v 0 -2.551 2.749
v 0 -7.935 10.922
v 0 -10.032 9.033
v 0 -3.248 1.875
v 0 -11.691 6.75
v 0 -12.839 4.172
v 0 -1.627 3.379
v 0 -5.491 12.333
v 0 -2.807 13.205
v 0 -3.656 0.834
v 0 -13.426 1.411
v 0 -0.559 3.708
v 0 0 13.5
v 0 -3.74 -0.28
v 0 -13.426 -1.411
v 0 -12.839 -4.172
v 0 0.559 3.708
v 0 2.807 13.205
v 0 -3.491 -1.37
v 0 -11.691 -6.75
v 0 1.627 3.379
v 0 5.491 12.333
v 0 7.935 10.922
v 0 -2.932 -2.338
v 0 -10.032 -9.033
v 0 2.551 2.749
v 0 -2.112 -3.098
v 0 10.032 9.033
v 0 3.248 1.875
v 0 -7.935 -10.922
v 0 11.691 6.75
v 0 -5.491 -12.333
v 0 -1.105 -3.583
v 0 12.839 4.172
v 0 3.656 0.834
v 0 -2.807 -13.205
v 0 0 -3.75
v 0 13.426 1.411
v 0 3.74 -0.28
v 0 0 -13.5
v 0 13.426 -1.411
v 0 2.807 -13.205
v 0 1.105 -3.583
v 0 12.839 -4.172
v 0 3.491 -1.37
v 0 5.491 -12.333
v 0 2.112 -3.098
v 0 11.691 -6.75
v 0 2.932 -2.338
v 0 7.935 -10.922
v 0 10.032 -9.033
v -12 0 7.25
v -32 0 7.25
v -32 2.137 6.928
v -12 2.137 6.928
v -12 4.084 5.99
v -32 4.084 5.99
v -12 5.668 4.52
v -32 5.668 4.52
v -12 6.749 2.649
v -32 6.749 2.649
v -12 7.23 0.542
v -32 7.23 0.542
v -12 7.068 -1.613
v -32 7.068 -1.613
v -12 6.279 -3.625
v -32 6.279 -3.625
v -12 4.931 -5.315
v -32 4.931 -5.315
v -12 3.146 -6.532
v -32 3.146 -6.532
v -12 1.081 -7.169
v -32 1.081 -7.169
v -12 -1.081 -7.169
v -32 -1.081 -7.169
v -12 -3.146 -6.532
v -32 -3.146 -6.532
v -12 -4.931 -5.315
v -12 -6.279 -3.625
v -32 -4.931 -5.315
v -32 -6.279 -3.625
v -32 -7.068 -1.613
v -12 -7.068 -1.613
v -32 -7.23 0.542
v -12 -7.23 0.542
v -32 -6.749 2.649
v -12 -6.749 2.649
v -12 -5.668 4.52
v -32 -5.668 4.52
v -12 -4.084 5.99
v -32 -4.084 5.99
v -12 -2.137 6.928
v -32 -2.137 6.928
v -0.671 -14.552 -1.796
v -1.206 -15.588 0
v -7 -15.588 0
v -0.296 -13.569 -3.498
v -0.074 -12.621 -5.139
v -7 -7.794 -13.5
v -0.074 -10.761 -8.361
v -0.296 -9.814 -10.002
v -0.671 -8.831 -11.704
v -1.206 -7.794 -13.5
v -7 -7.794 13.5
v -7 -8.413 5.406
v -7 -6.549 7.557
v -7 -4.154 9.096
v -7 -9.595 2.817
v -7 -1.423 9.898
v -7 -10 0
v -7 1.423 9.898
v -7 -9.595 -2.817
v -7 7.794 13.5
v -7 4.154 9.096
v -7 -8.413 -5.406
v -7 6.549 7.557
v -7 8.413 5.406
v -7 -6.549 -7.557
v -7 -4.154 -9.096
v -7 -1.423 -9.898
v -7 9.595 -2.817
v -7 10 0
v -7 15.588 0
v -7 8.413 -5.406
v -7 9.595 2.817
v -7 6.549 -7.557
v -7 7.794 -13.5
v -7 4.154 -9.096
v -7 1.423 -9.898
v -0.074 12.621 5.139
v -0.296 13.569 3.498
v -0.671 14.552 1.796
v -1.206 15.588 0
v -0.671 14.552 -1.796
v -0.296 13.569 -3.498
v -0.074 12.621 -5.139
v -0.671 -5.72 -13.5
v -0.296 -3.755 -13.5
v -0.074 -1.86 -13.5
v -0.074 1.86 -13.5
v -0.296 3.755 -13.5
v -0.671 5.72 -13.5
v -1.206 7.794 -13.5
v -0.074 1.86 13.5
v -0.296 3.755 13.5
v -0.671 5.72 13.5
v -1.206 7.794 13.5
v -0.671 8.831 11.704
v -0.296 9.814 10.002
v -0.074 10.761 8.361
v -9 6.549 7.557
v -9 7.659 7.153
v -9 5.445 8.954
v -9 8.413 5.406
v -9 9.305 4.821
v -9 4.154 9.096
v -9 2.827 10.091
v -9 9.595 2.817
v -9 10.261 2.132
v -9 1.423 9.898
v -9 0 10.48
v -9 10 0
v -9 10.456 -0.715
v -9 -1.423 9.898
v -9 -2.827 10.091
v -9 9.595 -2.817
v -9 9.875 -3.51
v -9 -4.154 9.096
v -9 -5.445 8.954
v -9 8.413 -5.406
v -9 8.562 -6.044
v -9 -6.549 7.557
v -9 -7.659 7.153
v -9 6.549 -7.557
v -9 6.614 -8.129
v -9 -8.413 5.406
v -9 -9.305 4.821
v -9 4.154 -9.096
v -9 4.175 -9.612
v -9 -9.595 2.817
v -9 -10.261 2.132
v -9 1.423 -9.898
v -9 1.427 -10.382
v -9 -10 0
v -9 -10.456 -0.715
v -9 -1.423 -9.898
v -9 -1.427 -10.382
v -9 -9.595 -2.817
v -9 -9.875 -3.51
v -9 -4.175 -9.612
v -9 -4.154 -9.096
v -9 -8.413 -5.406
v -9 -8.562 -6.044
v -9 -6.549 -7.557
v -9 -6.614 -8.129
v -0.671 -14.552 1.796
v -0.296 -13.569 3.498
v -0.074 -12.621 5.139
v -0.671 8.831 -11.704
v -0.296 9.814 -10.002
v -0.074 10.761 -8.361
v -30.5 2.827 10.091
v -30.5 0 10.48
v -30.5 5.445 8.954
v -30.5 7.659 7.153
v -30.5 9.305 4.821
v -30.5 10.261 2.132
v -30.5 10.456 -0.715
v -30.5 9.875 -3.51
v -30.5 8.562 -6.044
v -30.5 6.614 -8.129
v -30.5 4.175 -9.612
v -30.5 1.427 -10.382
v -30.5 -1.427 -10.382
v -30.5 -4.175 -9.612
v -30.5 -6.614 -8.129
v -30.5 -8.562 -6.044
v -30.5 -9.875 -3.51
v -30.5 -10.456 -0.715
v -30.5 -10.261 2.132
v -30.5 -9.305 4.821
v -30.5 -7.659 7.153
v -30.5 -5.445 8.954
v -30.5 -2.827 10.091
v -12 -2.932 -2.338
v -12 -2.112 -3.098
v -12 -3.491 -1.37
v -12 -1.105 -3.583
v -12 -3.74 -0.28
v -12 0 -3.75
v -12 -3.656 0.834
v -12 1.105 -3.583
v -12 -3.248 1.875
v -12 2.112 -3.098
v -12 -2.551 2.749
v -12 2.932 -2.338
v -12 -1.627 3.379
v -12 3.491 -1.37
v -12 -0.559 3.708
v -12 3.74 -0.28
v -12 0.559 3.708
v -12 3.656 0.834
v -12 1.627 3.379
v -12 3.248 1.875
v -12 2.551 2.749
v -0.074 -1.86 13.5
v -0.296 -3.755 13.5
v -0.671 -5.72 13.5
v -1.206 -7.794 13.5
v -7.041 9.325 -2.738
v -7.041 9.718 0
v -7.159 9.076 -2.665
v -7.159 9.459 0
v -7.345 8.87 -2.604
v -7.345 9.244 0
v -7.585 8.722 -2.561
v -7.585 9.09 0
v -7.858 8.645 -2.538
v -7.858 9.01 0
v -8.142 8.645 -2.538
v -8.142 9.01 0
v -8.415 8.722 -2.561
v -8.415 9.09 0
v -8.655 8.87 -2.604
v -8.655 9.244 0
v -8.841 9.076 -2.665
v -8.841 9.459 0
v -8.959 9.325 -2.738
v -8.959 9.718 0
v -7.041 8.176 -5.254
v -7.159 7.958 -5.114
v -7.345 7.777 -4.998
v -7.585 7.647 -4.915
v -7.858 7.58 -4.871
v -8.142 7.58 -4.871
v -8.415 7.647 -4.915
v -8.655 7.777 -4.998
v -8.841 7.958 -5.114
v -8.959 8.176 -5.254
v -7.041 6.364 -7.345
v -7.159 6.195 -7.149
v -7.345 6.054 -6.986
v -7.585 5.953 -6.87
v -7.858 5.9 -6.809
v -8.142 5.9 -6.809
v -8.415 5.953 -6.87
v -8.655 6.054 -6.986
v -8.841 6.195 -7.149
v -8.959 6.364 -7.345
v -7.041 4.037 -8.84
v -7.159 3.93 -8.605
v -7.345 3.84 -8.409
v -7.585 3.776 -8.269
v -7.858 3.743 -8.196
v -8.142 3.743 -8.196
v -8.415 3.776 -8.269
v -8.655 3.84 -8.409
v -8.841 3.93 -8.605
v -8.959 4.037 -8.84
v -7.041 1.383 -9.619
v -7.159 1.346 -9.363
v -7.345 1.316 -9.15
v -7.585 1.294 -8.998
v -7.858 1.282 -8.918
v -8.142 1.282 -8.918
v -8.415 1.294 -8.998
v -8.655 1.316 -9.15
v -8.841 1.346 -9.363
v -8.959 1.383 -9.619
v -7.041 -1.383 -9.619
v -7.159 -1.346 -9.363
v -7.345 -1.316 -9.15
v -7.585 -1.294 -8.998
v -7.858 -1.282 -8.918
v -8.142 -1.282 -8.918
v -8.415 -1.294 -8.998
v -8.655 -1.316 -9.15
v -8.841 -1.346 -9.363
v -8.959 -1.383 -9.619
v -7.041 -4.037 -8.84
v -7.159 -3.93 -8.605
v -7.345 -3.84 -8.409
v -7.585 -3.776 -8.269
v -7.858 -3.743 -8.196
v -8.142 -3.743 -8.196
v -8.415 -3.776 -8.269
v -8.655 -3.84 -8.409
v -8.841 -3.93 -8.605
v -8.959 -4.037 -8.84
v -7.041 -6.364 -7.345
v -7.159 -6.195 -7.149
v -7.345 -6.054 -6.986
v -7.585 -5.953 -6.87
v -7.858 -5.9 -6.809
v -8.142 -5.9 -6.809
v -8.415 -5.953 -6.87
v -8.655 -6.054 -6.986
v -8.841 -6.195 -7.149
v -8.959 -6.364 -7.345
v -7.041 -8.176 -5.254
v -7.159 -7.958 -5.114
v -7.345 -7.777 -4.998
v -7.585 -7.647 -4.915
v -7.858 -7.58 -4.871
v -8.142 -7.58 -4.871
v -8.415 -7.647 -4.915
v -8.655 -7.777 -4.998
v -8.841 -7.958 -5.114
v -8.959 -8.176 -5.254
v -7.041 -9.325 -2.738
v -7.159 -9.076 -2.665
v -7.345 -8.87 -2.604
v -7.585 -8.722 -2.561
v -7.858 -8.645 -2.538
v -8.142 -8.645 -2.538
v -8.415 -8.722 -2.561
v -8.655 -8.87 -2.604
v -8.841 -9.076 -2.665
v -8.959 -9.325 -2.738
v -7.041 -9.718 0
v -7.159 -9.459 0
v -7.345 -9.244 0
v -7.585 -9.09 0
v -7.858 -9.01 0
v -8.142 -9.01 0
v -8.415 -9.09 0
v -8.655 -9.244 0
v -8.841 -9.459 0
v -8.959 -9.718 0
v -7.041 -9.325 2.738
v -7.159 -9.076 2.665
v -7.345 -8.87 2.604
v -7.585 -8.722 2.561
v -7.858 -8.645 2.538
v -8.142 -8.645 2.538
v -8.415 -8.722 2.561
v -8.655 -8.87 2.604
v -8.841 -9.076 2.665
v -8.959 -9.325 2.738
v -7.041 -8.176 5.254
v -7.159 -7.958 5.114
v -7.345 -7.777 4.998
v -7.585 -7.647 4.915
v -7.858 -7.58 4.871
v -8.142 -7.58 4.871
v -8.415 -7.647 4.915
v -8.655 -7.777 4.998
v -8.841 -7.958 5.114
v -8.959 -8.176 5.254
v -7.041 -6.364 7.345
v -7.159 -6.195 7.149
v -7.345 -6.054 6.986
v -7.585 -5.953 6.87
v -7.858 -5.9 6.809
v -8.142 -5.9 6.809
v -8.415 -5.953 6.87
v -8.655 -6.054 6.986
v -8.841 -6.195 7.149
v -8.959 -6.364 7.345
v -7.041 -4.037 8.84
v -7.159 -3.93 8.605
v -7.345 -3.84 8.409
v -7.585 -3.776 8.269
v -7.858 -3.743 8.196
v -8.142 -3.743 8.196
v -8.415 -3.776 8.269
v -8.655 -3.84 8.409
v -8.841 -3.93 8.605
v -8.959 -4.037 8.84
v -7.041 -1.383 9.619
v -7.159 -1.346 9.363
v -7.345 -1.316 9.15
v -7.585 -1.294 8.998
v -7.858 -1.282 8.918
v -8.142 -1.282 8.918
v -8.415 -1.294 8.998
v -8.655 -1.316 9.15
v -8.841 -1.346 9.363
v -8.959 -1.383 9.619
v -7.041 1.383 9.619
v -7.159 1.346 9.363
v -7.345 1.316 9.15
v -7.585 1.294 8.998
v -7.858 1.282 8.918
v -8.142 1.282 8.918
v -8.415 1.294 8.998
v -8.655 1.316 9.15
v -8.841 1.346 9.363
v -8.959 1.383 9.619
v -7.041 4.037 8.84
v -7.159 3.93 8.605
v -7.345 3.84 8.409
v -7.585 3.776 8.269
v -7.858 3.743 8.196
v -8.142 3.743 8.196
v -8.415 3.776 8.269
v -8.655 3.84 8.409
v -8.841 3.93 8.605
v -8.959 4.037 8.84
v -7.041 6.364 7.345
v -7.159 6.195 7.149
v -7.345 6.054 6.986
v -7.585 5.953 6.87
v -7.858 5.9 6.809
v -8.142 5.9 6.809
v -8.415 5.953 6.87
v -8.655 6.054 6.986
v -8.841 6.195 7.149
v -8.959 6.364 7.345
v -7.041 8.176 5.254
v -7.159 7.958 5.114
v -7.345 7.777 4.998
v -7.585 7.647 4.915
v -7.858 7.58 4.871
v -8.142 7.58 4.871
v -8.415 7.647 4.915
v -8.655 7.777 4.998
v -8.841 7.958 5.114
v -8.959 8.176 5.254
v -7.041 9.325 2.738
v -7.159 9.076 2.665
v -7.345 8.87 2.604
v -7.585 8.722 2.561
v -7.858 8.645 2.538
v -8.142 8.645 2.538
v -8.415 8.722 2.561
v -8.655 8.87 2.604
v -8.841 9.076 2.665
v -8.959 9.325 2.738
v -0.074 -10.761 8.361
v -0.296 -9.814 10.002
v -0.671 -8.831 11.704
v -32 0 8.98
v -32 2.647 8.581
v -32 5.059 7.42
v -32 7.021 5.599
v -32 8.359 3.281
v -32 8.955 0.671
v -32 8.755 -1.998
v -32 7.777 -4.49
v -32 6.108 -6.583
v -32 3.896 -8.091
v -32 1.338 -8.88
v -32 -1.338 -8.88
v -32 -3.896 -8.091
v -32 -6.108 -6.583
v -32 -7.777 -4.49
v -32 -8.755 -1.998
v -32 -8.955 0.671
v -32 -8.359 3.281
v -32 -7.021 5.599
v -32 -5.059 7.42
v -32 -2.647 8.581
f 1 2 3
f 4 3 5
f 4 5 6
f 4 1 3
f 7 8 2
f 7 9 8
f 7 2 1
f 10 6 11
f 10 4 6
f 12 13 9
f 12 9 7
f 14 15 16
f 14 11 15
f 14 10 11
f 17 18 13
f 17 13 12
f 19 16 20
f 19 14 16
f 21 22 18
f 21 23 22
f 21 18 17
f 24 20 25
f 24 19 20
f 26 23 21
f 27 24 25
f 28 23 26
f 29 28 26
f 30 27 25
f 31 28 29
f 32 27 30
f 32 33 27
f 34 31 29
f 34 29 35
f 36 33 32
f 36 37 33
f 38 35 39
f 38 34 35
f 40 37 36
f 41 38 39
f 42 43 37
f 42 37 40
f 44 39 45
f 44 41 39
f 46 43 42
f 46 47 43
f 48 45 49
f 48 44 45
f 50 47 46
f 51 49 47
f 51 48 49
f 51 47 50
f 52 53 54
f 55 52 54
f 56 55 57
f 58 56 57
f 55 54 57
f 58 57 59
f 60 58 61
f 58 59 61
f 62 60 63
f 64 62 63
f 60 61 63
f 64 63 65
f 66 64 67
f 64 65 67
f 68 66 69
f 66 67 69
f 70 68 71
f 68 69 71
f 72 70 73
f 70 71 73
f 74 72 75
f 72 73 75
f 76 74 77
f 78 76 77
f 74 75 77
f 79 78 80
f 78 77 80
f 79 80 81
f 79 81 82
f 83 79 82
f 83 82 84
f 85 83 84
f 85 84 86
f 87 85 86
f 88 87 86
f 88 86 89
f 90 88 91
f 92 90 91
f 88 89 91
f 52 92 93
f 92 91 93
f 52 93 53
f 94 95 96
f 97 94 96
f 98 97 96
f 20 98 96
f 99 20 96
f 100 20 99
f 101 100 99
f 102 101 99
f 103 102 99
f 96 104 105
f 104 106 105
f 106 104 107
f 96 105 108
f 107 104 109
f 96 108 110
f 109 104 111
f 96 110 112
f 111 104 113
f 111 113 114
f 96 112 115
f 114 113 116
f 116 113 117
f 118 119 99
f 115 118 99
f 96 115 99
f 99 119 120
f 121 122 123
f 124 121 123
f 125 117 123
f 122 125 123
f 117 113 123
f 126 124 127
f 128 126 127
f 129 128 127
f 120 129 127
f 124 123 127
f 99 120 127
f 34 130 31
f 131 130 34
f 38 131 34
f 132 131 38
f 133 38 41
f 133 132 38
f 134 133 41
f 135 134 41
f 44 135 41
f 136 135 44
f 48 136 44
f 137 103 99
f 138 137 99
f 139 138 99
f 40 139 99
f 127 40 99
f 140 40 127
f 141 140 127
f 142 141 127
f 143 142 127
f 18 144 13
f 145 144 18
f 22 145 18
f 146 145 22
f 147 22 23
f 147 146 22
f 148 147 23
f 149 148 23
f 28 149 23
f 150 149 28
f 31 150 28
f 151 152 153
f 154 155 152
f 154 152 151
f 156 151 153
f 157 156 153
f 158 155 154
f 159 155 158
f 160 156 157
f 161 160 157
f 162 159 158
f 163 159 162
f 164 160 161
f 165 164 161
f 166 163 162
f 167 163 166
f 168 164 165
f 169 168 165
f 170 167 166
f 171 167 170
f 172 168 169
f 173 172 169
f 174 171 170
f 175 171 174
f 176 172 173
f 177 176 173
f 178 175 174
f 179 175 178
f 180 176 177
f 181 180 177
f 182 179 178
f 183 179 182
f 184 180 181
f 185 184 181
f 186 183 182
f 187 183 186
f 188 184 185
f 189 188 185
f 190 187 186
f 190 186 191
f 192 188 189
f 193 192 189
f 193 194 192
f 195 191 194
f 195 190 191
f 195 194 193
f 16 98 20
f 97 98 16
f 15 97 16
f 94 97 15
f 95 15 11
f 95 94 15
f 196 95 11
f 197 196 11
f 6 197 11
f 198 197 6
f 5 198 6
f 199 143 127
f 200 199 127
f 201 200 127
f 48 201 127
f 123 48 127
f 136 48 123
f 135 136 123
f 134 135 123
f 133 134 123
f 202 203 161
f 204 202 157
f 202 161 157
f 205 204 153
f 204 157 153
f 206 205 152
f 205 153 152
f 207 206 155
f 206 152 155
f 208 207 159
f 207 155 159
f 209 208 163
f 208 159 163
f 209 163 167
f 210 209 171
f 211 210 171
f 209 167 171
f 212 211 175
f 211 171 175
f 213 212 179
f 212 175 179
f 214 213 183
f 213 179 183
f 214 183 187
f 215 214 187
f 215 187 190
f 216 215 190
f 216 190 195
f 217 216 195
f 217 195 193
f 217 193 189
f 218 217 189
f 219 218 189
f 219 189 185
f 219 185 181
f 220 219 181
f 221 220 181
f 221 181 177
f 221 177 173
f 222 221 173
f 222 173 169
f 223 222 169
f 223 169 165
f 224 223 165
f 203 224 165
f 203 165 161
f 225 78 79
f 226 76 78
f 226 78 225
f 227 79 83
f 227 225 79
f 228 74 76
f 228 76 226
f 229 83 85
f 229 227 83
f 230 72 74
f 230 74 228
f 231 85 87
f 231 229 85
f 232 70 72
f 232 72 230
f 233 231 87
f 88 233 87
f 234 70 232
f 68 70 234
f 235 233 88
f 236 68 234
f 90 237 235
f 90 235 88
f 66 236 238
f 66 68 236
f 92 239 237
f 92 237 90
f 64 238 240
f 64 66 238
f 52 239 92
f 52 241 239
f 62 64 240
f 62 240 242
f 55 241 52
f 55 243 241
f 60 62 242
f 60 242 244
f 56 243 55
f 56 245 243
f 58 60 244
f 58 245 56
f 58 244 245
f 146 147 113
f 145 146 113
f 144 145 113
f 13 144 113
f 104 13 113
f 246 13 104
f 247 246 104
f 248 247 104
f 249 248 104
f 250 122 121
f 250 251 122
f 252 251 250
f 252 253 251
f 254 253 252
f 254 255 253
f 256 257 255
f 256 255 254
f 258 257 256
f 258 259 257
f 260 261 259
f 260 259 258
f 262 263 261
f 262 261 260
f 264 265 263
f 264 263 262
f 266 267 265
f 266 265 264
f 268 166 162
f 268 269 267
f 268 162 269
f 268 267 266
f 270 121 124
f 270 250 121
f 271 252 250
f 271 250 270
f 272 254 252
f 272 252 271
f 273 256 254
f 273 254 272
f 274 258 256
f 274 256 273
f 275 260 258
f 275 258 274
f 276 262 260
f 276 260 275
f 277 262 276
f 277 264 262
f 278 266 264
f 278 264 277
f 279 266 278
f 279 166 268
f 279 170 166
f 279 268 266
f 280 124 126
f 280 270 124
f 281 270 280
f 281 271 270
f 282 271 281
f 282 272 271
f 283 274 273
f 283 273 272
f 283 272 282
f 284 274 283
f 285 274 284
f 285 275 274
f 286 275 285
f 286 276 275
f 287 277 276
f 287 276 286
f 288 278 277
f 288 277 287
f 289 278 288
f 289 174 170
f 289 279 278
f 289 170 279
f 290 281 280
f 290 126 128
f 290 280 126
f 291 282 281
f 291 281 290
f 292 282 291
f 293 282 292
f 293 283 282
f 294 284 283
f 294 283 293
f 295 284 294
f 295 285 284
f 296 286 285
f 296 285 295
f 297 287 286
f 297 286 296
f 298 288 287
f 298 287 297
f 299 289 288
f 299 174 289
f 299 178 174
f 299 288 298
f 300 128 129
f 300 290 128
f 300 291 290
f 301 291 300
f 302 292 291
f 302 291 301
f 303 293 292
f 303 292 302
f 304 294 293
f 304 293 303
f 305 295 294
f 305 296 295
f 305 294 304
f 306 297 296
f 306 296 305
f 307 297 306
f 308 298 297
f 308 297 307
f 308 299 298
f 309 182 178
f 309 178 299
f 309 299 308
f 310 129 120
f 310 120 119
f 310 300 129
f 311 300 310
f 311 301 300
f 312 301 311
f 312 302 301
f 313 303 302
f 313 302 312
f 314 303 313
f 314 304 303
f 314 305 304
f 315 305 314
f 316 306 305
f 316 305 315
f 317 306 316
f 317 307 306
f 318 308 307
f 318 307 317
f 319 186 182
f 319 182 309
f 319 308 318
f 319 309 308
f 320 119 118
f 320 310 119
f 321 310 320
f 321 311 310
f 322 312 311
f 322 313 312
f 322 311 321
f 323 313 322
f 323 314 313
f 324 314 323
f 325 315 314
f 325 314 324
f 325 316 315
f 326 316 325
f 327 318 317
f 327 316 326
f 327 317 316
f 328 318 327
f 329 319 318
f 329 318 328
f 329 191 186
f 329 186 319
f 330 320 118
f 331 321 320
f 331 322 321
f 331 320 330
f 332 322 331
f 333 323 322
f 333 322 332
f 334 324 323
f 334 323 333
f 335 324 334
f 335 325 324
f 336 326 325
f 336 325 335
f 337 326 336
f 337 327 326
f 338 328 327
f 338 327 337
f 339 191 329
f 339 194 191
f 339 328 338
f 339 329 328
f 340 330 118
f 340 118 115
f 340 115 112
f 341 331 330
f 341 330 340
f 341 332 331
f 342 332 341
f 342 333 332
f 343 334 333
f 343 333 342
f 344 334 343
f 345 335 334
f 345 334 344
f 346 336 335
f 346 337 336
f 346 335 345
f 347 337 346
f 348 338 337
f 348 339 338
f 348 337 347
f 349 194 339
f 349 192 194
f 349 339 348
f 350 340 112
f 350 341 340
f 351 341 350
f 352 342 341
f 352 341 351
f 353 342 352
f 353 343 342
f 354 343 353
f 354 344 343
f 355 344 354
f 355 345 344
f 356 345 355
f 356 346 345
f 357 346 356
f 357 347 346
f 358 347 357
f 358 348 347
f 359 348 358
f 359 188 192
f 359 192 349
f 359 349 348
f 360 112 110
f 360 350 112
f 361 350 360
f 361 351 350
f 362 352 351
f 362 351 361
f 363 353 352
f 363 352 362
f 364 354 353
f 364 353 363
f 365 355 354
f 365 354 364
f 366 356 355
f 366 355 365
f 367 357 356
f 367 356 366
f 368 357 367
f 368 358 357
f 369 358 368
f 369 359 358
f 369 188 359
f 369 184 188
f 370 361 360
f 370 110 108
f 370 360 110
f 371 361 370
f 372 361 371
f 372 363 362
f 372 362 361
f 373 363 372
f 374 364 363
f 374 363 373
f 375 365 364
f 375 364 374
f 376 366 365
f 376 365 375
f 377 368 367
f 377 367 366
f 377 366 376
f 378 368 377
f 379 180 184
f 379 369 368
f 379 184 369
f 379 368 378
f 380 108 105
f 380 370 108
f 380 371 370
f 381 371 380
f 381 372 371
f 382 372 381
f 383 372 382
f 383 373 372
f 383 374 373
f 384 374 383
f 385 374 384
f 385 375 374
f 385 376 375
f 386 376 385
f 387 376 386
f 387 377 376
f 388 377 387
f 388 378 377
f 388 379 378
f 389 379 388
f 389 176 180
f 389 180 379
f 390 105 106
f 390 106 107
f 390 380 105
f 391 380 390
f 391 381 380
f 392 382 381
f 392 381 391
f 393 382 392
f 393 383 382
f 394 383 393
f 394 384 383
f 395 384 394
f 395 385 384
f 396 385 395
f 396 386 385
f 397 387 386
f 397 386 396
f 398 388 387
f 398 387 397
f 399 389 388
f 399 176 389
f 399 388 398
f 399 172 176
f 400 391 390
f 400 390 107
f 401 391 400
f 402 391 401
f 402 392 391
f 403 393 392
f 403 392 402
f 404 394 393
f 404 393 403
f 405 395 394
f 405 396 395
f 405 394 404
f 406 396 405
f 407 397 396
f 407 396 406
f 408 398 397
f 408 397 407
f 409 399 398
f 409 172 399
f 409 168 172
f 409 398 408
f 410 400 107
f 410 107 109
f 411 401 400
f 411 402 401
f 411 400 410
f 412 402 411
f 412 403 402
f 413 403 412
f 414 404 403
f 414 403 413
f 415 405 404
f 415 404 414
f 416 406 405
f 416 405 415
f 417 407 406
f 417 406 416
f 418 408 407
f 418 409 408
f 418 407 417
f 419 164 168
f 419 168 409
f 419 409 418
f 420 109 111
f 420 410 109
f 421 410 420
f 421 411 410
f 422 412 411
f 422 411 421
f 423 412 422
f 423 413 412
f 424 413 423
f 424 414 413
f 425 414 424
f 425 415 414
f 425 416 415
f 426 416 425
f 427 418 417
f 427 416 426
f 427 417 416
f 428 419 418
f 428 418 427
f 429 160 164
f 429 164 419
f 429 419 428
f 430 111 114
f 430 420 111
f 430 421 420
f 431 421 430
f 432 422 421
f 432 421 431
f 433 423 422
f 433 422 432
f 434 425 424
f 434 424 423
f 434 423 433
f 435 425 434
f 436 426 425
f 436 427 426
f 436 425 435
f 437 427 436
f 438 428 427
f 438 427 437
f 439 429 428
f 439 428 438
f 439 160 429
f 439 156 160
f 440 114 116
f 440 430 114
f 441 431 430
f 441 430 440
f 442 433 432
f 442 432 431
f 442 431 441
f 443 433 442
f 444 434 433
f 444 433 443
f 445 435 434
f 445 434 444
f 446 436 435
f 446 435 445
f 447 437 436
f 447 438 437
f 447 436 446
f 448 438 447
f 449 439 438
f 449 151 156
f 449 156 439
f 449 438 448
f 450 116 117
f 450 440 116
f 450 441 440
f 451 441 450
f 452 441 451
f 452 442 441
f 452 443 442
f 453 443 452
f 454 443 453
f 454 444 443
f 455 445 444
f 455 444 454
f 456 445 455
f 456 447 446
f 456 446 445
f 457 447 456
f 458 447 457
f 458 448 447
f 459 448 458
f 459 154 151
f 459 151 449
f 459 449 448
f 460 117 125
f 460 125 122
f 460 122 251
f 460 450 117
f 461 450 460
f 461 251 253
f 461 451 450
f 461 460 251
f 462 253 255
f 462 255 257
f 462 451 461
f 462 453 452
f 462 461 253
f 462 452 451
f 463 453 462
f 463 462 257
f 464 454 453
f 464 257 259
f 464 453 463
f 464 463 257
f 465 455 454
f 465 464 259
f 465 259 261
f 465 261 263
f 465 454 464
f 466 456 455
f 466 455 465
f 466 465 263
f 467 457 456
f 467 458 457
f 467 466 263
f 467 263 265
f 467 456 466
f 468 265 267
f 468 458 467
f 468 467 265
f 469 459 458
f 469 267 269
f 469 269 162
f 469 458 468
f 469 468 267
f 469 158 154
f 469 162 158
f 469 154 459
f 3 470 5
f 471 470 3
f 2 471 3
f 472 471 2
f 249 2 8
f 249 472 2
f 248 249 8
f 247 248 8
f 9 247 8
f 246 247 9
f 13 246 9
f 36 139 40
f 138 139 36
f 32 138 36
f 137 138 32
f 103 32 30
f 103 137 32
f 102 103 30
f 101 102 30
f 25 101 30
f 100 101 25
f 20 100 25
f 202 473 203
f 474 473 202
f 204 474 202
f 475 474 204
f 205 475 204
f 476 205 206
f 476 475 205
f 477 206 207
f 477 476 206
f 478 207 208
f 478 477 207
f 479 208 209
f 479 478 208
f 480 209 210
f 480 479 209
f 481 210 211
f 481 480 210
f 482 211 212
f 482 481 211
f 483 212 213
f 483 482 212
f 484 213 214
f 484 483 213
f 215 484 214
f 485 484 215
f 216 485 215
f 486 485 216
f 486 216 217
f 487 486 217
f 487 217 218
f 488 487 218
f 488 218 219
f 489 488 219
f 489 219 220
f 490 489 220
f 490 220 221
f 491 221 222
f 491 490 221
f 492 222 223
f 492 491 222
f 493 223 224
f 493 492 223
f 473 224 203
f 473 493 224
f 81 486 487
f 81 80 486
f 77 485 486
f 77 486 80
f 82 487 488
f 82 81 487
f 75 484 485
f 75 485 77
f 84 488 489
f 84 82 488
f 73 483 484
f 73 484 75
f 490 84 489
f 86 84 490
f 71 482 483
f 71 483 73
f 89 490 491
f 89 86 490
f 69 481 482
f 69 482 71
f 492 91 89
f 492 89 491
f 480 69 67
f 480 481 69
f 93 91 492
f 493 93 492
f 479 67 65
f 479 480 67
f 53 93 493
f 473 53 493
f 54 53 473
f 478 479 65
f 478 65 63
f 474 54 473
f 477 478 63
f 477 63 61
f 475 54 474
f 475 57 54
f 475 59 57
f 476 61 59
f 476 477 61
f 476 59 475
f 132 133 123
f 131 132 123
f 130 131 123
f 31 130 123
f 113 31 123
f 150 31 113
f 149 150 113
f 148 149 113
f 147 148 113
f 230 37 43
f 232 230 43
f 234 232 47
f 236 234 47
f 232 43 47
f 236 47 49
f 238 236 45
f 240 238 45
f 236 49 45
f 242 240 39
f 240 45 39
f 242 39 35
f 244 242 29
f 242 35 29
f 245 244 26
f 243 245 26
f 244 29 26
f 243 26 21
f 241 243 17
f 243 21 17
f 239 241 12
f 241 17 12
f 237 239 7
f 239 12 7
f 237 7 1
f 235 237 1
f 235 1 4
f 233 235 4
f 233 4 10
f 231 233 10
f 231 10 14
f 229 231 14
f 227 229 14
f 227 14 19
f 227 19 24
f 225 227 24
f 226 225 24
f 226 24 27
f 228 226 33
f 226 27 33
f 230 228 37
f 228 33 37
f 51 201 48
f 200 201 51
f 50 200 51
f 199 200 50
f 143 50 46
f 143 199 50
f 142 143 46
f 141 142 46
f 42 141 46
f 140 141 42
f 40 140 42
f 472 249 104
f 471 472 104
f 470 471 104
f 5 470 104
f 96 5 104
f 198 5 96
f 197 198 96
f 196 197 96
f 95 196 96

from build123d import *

# Parameters (mm, degrees)
DODANIE_WYCI_GNI_CIE1_DEPTH = 7
SZKIC2_OUTSIDE_W            = 61.616
SZKIC2_OUTSIDE_H            = 65.792
SZKIC2_OUTSIDE_R            = 13.5
WYTNIJ_WYCI_GNI_CIE1_DEPTH  = 7
WYTNIJ_WYCI_GNI_CIE1_TAPER  = 60
SZKIC3_R                    = 10.48
DODANIE_WYCI_GNI_CIE2_DEPTH = 25
SZKIC4_R                    = 7.25
WYTNIJ_WYCI_GNI_CIE2_DEPTH  = 20
SZKIC5_R                    = 3.75
WYTNIJ_WYCI_GNI_CIE3_DEPTH  = 12
SFAZOWANIE1_SIZE            = 1.5


with BuildPart() as part:
    # Szkic1 → Dodanie-wyciągnięcie1 (new body)
    with BuildSketch(Plane(origin=(0, 0, 0), x_dir=(0, 0, -1), z_dir=(1, 0, 0))):
        Polygon((13.5, 7.794228634), (0, 15.588457268), (-13.5, 7.794228634), (-13.5, -7.794228634), (0, -15.588457268), (13.5, -7.794228634), align=None)
    extrude(amount=-DODANIE_WYCI_GNI_CIE1_DEPTH)

    # Szkic2 outside → Wytnij-wyciągnięcie1 (cut)
    with BuildSketch(Plane(origin=(0, 0, 0), x_dir=(0, 0, -1), z_dir=(1, 0, 0))):
        Rectangle(SZKIC2_OUTSIDE_W, SZKIC2_OUTSIDE_H)
        Circle(SZKIC2_OUTSIDE_R, mode=Mode.SUBTRACT)
    extrude(amount=-WYTNIJ_WYCI_GNI_CIE1_DEPTH, taper=WYTNIJ_WYCI_GNI_CIE1_TAPER, mode=Mode.SUBTRACT)

    # Szkic3 → Dodanie-wyciągnięcie2 (add)
    with BuildSketch(Plane.ZY.offset(7)):
        Circle(SZKIC3_R)
    extrude(amount=DODANIE_WYCI_GNI_CIE2_DEPTH)

    # Szkic4 → Wytnij-wyciągnięcie2 (cut)
    with BuildSketch(Plane.ZY.offset(32)):
        Circle(SZKIC4_R)
    extrude(amount=-WYTNIJ_WYCI_GNI_CIE2_DEPTH, mode=Mode.SUBTRACT)

    # Szkic5 → Wytnij-wyciągnięcie3 (cut)
    with BuildSketch(Plane(origin=(0, 0, 0), x_dir=(0, 0, -1), z_dir=(1, 0, 0))):
        Circle(SZKIC5_R)
    extrude(amount=-WYTNIJ_WYCI_GNI_CIE3_DEPTH, mode=Mode.SUBTRACT)

    # Sfazowanie1
    sfazowanie1_edges = [part.edges().sort_by_distance(p)[0] for p in [
        (-32, 0, -10.48),
    ]]
    chamfer(sfazowanie1_edges, length=SFAZOWANIE1_SIZE)

    # Szkic6 → Wycięcie-obrót1 (revolve, cut)
    with BuildSketch(Plane.XY):
        with BuildLine():
            Line((-9, 10), (-9, 11.5))
            Line((-9, 11.5), (-7, 11.5))
            Line((-7, 11.5), (-7, 10))
            ThreePointArc((-7, 10), (-8, 9), (-9, 10))
        make_face()
    revolve(axis=Axis((0, 0, 0), (-1, 0, 0)), mode=Mode.SUBTRACT)


solid = part.part
